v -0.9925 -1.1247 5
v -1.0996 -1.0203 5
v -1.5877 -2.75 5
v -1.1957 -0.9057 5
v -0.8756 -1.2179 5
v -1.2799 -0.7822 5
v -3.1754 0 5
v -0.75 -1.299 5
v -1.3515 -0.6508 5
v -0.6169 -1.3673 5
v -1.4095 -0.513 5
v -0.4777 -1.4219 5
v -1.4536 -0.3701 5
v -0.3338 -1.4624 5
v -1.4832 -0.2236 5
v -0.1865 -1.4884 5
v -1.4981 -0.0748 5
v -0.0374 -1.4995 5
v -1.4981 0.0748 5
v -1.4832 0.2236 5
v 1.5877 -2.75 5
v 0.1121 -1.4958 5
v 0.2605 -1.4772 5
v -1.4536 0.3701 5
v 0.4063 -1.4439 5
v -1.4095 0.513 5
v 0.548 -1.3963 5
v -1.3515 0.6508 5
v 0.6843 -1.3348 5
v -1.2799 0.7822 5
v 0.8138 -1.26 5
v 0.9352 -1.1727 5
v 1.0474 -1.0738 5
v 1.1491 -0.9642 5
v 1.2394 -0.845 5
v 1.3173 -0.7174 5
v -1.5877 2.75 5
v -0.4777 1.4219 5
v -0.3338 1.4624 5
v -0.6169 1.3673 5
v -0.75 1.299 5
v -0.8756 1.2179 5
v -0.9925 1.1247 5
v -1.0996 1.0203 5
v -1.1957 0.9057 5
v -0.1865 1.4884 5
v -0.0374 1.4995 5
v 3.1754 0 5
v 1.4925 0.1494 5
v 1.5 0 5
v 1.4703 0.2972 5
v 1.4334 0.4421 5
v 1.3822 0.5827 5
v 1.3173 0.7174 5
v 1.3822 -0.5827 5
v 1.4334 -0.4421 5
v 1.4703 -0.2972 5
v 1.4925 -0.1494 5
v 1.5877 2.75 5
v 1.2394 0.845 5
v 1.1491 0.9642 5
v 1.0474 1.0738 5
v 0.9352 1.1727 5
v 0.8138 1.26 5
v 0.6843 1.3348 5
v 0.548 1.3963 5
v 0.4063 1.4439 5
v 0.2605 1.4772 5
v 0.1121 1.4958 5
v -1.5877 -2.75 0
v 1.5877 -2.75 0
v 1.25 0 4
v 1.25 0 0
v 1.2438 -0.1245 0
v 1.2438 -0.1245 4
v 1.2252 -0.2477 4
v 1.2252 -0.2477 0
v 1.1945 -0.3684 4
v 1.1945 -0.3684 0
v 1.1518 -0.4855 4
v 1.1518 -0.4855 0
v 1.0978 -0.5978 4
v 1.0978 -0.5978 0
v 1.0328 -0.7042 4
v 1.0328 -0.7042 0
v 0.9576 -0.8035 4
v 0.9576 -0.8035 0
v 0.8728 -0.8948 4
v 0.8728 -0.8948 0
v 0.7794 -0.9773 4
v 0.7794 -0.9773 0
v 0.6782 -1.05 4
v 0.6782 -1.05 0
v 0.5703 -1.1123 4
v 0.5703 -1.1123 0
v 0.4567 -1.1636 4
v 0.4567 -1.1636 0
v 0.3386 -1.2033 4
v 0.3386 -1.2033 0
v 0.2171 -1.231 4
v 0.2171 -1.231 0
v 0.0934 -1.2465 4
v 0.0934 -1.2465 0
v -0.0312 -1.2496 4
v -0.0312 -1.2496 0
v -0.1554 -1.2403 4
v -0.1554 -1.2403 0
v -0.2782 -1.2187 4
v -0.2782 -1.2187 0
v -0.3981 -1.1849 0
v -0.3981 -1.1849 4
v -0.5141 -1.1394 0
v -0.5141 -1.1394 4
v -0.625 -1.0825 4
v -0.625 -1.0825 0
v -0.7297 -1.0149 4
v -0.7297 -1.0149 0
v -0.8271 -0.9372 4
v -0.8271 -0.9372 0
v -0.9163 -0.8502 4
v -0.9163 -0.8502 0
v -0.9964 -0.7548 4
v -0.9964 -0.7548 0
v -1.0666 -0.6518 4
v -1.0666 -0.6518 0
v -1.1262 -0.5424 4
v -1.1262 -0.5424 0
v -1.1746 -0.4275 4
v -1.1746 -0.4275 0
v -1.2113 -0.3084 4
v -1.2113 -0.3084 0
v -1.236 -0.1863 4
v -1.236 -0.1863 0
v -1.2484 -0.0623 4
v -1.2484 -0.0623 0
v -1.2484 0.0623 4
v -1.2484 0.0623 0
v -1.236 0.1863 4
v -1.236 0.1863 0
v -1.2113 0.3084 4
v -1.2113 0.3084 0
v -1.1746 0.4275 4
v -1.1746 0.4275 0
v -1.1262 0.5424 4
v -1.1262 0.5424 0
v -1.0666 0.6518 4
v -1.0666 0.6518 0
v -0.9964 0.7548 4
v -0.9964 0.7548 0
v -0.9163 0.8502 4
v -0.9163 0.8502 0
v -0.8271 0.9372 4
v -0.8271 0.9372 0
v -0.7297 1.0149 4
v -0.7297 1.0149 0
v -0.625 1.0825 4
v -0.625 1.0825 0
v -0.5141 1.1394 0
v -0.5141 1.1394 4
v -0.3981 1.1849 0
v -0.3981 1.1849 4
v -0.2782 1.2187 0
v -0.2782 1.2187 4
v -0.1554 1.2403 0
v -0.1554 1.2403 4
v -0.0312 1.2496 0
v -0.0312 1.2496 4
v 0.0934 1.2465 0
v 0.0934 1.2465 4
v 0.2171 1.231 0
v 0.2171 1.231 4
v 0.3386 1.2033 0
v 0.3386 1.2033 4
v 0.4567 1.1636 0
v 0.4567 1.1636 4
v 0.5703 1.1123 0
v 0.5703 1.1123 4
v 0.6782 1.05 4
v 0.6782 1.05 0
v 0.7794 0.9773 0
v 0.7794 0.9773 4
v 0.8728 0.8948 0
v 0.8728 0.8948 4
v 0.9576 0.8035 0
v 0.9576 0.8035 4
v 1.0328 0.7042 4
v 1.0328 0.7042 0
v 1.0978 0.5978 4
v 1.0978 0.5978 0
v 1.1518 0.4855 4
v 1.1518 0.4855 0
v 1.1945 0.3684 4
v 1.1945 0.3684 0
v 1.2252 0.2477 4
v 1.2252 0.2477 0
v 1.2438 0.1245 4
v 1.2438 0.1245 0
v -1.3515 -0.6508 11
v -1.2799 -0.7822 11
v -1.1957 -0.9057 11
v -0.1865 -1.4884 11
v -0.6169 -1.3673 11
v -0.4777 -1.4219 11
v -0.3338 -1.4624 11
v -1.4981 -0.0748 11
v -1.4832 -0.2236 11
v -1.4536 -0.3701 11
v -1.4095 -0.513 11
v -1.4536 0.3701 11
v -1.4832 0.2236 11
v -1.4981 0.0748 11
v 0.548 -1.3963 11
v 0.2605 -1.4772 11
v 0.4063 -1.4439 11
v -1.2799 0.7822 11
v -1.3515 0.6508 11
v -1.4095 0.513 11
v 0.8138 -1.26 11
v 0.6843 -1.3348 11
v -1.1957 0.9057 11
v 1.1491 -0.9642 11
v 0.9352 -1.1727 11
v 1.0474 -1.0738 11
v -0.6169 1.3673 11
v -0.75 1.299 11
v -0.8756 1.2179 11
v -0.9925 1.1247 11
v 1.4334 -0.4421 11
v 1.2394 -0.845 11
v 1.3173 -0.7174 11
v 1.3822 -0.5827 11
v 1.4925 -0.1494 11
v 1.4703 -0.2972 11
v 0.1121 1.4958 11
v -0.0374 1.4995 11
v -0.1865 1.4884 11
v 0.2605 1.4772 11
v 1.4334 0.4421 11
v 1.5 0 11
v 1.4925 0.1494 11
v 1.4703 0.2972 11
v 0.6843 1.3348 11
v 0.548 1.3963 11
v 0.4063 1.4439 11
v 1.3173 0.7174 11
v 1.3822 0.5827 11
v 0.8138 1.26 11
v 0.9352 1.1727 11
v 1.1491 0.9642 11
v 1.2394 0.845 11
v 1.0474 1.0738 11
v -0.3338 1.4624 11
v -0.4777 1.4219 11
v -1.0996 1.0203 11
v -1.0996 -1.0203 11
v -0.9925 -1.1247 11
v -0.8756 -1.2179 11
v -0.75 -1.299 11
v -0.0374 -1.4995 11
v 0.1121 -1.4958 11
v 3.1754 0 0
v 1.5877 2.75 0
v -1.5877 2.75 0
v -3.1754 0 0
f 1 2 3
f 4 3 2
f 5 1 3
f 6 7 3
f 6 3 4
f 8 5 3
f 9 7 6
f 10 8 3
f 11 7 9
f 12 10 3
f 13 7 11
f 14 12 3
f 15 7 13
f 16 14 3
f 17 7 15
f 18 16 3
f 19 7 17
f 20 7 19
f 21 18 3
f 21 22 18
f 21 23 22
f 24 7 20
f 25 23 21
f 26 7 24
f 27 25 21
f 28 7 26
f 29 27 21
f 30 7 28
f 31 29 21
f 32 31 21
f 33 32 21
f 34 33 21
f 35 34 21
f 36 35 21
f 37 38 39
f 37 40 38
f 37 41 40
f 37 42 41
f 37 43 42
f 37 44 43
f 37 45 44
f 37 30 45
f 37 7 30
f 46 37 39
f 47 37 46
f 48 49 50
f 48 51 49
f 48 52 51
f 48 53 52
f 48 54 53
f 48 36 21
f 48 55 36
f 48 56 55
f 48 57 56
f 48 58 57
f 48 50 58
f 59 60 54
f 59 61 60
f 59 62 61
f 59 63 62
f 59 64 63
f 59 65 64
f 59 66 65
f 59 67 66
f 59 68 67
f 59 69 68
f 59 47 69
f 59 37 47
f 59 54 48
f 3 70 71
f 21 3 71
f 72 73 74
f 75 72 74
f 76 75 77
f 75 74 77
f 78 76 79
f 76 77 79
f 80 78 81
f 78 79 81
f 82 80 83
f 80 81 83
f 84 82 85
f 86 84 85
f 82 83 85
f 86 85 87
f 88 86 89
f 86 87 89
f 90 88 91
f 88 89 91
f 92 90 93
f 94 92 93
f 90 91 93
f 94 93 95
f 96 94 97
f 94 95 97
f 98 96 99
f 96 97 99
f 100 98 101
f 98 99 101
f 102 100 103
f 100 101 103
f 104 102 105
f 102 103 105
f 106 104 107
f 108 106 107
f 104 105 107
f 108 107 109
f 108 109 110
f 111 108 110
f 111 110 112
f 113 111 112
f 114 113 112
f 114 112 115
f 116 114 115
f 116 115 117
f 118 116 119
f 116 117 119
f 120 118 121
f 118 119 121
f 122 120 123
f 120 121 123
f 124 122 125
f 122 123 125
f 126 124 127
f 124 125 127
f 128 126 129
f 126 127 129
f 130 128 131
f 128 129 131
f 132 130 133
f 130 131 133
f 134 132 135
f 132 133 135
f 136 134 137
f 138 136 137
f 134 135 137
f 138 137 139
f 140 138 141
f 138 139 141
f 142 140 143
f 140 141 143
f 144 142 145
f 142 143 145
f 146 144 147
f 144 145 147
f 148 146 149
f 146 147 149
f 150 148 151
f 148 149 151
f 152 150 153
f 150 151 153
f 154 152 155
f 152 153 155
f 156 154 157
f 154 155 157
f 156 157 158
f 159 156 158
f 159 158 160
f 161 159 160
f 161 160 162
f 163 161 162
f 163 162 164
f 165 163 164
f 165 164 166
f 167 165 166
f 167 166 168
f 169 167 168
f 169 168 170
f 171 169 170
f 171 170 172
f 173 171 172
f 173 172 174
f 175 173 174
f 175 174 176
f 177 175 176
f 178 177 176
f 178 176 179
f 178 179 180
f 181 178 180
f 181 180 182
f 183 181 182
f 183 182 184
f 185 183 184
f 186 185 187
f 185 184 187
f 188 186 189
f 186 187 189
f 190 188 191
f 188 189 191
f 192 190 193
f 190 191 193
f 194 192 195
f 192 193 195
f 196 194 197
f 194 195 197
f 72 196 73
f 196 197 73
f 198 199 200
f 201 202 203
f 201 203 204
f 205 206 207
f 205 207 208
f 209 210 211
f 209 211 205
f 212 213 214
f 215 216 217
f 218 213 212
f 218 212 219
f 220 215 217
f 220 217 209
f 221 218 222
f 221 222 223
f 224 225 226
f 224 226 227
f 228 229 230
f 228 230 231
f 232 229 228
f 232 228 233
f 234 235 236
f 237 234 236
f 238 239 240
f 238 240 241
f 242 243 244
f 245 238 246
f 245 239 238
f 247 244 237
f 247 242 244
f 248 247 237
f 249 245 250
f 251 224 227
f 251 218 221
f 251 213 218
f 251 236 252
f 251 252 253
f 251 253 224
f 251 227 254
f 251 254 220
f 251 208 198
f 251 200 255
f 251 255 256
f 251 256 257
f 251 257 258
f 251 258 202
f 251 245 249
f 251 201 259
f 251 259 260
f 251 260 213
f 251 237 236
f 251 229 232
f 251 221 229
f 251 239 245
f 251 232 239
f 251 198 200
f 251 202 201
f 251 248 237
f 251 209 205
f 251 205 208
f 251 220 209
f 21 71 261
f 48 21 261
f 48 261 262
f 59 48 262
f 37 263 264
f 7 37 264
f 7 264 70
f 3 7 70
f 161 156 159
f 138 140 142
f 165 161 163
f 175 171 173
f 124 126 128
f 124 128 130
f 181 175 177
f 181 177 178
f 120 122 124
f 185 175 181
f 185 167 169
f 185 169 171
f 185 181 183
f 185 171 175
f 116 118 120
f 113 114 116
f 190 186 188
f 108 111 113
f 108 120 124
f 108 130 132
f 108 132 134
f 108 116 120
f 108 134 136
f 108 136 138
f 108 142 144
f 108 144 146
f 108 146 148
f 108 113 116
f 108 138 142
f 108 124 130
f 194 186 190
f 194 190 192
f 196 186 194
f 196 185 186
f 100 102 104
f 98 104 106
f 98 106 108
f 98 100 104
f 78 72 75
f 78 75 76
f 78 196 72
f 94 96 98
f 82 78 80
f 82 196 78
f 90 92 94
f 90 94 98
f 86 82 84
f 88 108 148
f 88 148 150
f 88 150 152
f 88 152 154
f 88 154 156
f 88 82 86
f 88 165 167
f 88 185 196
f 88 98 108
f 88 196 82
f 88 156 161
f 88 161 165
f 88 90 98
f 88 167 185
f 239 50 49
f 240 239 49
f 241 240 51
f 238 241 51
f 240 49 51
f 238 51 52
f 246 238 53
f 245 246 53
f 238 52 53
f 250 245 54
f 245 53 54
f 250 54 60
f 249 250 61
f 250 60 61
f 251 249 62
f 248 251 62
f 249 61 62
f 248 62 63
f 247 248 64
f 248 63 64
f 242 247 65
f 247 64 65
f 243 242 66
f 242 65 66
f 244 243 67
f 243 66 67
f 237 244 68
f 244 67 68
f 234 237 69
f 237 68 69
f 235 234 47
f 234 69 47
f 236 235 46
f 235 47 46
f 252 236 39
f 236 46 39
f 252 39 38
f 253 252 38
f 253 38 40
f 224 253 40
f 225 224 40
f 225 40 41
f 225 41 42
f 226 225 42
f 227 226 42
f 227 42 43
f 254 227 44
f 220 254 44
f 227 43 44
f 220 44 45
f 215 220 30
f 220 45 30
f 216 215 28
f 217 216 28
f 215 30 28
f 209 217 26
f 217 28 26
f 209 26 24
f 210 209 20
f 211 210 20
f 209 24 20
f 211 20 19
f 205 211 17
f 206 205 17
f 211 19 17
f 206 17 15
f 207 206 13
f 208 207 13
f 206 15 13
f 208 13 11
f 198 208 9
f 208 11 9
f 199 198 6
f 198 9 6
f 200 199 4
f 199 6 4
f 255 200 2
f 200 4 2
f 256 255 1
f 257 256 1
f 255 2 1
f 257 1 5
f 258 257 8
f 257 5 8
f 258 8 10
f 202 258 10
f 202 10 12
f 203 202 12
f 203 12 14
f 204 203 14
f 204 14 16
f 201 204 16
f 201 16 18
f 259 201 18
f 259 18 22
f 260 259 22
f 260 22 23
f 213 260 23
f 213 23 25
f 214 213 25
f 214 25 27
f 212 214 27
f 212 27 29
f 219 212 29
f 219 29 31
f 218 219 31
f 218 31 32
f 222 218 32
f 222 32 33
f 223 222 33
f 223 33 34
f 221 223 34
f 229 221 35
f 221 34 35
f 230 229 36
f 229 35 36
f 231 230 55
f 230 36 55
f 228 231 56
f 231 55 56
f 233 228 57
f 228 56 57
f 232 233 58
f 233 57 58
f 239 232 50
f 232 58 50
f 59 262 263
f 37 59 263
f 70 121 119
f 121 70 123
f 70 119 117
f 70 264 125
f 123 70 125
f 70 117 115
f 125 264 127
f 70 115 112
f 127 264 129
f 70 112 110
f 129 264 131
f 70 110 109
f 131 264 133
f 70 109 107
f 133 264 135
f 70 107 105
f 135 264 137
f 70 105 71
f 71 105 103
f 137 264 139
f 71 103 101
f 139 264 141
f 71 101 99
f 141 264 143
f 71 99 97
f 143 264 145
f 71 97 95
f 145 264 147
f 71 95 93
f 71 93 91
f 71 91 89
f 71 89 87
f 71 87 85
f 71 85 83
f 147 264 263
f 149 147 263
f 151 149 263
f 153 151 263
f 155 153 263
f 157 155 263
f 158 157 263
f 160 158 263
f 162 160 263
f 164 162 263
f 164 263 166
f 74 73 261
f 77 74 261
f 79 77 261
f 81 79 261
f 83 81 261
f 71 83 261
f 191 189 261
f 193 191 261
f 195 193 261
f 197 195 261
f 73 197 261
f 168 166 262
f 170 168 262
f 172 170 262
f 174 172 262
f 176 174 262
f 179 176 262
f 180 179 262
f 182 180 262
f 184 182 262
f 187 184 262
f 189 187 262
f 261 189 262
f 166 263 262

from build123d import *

# Parameters (mm, degrees)
F1_DEPTH = 5
F2_R     = 1.5
F3_DEPTH = 6
F4_R     = 1.25
F5_DEPTH = 4


with BuildPart() as f1:
    # F0 (on Top) → F1 (new body)
    with BuildSketch(Plane.XY):
        Polygon((1.587713, 2.75), (-1.587713, 2.75), (-3.175426, 0), (-1.587713, -2.75), (1.587713, -2.75), (3.175426, 0), align=None)
    extrude(amount=F1_DEPTH)

    # F2 (on face) → F3 (join)
    with BuildSketch(Plane.XY.offset(5)):
        Circle(F2_R)
    extrude(amount=F3_DEPTH)

    # F4 (on face) → F5 (cut)
    with BuildSketch(Plane(origin=(0, 0, 0), x_dir=(1, 0, 0), z_dir=(0, 0, -1))):
        Circle(F4_R)
    extrude(amount=-F5_DEPTH, mode=Mode.SUBTRACT)


solid = f1.part
